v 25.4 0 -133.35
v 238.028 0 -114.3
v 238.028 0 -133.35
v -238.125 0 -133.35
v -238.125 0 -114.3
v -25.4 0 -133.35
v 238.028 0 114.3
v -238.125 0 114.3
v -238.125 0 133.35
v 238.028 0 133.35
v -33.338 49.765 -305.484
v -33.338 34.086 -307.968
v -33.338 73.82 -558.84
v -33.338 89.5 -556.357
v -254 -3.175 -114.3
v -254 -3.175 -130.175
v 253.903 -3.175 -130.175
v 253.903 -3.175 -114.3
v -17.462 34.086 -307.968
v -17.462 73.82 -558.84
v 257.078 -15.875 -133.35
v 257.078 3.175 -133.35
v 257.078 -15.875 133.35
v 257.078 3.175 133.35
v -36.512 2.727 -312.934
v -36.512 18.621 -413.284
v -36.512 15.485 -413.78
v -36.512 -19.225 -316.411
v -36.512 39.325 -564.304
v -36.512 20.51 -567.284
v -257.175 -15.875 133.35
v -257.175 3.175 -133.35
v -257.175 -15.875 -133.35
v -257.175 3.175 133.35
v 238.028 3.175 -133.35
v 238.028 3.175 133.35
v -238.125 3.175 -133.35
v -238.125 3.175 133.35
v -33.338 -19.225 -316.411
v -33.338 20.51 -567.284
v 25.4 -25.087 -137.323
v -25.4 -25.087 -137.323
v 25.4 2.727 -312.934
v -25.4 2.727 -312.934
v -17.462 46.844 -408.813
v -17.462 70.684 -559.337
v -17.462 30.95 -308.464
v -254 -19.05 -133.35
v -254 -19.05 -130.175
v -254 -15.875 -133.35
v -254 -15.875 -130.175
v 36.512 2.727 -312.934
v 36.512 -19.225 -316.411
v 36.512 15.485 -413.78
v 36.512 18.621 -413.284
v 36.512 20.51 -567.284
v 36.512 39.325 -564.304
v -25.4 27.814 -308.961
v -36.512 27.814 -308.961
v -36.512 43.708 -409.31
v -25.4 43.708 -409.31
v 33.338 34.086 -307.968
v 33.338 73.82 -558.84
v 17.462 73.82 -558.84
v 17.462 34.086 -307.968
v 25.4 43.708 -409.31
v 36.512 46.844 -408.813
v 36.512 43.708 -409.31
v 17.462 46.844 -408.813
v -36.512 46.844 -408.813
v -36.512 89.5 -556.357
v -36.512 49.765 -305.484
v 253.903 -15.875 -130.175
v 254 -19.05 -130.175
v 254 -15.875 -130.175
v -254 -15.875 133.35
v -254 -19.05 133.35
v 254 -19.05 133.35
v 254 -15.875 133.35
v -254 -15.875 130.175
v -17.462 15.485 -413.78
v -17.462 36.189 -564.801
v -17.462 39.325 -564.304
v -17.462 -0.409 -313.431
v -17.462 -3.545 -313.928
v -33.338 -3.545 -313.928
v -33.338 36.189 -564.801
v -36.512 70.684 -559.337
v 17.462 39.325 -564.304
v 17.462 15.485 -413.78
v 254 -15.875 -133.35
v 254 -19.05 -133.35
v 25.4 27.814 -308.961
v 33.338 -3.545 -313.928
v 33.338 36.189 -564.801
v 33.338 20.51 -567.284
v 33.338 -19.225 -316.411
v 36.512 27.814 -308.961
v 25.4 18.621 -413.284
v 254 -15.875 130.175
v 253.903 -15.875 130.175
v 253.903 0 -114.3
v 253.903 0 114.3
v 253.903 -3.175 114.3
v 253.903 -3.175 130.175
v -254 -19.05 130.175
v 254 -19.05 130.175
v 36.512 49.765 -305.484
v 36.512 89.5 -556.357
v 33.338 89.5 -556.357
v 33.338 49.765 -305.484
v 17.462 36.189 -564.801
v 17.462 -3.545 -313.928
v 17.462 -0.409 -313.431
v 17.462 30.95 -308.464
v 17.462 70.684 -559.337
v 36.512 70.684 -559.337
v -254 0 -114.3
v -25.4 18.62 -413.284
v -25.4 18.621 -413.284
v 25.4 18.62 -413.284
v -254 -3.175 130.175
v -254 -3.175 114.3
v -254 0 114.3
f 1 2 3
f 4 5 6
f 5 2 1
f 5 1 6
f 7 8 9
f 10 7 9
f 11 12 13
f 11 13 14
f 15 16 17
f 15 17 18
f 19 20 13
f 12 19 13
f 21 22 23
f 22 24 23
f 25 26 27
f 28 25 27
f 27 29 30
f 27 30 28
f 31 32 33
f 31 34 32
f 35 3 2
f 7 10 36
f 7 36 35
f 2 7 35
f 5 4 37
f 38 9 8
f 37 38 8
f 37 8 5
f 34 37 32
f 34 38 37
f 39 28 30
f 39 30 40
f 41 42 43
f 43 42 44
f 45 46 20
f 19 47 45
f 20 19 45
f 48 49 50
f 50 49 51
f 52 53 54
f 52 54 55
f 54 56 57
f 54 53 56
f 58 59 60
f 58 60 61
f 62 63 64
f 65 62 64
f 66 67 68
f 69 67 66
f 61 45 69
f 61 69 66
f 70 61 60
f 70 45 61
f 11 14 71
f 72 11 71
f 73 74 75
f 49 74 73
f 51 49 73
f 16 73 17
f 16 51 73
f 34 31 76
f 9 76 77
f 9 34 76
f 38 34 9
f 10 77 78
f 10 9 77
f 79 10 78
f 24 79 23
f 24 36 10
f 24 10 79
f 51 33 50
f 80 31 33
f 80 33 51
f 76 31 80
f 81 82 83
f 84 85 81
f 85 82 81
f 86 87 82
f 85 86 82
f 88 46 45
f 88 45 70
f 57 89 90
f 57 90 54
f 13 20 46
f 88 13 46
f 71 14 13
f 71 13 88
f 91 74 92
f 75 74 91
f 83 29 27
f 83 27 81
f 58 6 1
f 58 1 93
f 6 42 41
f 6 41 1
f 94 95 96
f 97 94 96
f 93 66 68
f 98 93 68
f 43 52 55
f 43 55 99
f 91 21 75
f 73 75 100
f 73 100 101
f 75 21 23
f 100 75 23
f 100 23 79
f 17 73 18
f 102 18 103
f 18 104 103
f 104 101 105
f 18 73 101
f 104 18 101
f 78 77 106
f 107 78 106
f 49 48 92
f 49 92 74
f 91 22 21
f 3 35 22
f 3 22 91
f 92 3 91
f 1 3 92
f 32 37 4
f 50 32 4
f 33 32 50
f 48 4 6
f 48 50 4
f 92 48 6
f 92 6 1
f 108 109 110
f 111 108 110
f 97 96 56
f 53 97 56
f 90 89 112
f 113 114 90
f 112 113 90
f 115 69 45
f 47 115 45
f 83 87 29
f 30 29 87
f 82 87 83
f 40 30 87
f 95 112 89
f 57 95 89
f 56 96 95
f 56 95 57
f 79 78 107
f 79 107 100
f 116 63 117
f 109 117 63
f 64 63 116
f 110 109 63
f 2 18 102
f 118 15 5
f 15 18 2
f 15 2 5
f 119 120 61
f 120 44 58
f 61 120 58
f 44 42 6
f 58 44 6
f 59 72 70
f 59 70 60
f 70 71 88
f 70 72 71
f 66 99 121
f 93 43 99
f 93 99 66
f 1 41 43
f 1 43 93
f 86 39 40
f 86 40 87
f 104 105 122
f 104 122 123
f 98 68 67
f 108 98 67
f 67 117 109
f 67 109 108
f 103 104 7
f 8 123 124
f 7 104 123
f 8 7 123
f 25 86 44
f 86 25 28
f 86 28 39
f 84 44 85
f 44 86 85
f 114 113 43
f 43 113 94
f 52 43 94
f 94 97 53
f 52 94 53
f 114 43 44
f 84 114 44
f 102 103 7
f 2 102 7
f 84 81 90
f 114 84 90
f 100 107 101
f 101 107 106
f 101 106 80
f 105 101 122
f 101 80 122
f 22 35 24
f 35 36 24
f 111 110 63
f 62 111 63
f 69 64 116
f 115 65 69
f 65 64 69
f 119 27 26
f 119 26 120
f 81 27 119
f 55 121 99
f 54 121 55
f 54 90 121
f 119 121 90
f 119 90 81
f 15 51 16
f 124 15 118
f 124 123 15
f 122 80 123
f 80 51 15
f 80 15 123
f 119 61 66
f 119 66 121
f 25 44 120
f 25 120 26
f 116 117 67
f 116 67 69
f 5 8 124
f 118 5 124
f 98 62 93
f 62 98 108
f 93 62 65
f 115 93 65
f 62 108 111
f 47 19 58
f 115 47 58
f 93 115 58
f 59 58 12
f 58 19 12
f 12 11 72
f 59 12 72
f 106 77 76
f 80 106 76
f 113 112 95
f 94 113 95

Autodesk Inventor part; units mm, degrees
ref_plane "YZ Plane" through (0, 0, 0) normal (1, 0, 0) x (0, 1, 0)
sketch "Sketch1" plane through (0, 0, 0) normal (1, 0, 0) x (0, 1, 0)
  line L0 (-3.175, 114.3) -> (0, 114.3)
  line L1 (0, 114.3) -> (0, 133.35)
  line L2 (0, 133.35) -> (-19.05, 133.35)
  line L3 (-19.05, 133.35) -> (-19.05, 130.175)
  line L4 (-19.05, 130.175) -> (-3.175, 130.175)
  line L5 (-3.175, 130.175) -> (-3.175, 114.3)
  line L6 (0, -114.3) -> (0, -133.35)
  line L7 (0, -133.35) -> (-19.05, -133.35)
  line L8 (-19.05, -133.35) -> (-19.05, -130.175)
  line L9 (-19.05, -130.175) -> (-3.175, -130.175)
  line L10 (-3.175, -130.175) -> (-3.175, -114.3)
  line L11 (-3.175, -114.3) -> (0, -114.3)
  line L12 (-25.4768, 0) -> (19.5105, 0) construction
  line L13 (0, -349.8749) -> (0, 213.8875) construction
  point P0 (0, 0)
  dimension "d0" = 19.05
  dimension "d1" = 19.05
  dimension "d3" = 266.7
  dimension "d4" = 3.175
extrude "Extrusion1" add sketch "Sketch1" along normal mid plane 508
sketch "Sketch3" plane through (0, 0, 0) normal (1, 0, 0) x (0, 1, 0)
  line L0 (-25.0873, -137.3234) -> (18.6205, -413.2836)
  line L1 (0, -323.2049) -> (0, 53.8675) projected
  line L2 (-25.0873, -137.3234) -> (0, -133.35)
  line L3 (0, -133.35) -> (43.7078, -409.3101)
  line L4 (43.7078, -409.3101) -> (18.6205, -413.2836)
  point P0 (0, 0)
  dimension "d7" = 9
  dimension "d8" = 279.4
  dimension "d10" = 25.4
extrude "Extrusion2" add sketch "Sketch3" along normal mid plane 50.8
sketch "Sketch12" plane through (-25.4, -25.0873, -137.3234) normal (0, -0.1564, 0.9877) x (1, 0, 0)
  line L0 (3.175, 3.175) -> (47.625, 3.175)
  line L1 (47.625, 3.175) -> (47.625, 22.225)
  line L2 (47.625, 22.225) -> (3.175, 22.225)
  line L3 (3.175, 22.225) -> (3.175, 3.175)
  line L4 (0, 25.4) -> (50.8, 25.4) projected
  line L5 (50.8, 0) -> (50.8, 25.4) projected
  line L6 (0, 25.4) -> (0, 0) projected
  line L7 (0, 0) -> (50.8, 0) projected
  point P0 (25.4, 46.2605)
  dimension "d50" = 3.175
  dimension "d51" = 3.175
  dimension "d52" = 3.175
  dimension "d53" = 3.175
sketch "Sketch4" plane through (-254, -19.05, 133.35) normal (0, 0, 1) x (1, 0, 0)
  line L0 (228.6, 19.05) -> (0, 19.05) projected
  line L1 (15.875, 19.05) -> (15.875, 22.225)
  line L2 (15.875, 22.225) -> (-3.175, 22.225)
  line L3 (-3.175, 22.225) -> (-3.175, 3.175)
  line L4 (-3.175, 3.175) -> (0, 3.175)
  line L5 (0, 3.175) -> (0, 19.05)
  line L6 (0, 19.05) -> (15.875, 19.05)
  line L7 (492.028, 19.05) -> (492.028, 22.225)
  line L8 (492.028, 22.225) -> (511.078, 22.225)
  line L9 (511.078, 22.225) -> (511.078, 3.175)
  line L10 (511.078, 3.175) -> (507.903, 3.175)
  line L11 (507.903, 3.175) -> (507.903, 19.05)
  line L12 (507.903, 19.05) -> (492.028, 19.05)
  line L13 (508, 19.05) -> (279.4, 19.05) projected
  line L14 (0, 19.05) -> (508, 19.05) projected
  point P0 (254, 19.05)
  dimension "d13" = 19.05
  dimension "d15" = 3.175
extrude "Extrusion3" add sketch "Sketch4" against normal up to surface (266.7 mm away)
sketch "Sketch6" plane through (25.4, 43.7078, -409.3101) normal (0, 0.1564, -0.9877) x (-1, 0, 0)
  line L0 (50.8, 0) -> (0, 0) construction
  line L1 (0, -25.4) -> (0, 0) construction
  line L2 (50.8, -25.4) -> (0, -25.4) construction
  line L3 (50.8, 0) -> (50.8, -25.4) construction
  line L4 (0, 0) -> (50.8, 0) construction
  line L5 (42.8625, 3.175) -> (42.8625, 6.35)
  line L6 (42.8625, 6.35) -> (58.7375, 6.35)
  line L7 (58.7375, 6.35) -> (58.7375, 22.225)
  line L8 (58.7375, 22.225) -> (61.9125, 22.225)
  line L9 (61.9125, 22.225) -> (61.9125, 3.175)
  line L10 (42.8625, 3.175) -> (61.9125, 3.175)
  line L11 (25.4, -25.4) -> (25.4, -0.1558) construction
  point P0 (25.4, 20.8605)
  dimension "d18" = 19.05
  dimension "d19" = 3.175
  dimension "d20" = 25.4
  dimension "d21" = 17.4625
  dimension "d47" = 3.175
extrude "Extrusion4" add sketch "Sketch6" along normal blind 152.4 and the other way blind 101.6
ref_plane "Work Plane1" through (0, 0, 0) normal (-1, 0, 0) x (0, 0, 1)
mirror "Mirror1" about plane through (0, 0, 0) normal (-1, 0, 0) of "Extrusion4"
sketch "Sketch10" plane through (25.4, 43.7078, -409.3101) normal (0, 0.1564, -0.9877) x (-1, 0, 0)
  line L0 (-11.1125, 3.175) -> (61.9125, 3.175)
  line L1 (61.9125, 3.175) -> (61.9125, 0)
  line L2 (61.9125, 0) -> (-11.1125, 0)
  line L3 (-11.1125, 0) -> (-11.1125, 3.175)
  line L4 (61.9125, 3.175) -> (61.9125, 22.225) projected
  line L5 (50.8, 0) -> (0, 0) projected
  line L6 (42.8625, 3.175) -> (61.9125, 3.175) projected
  line L7 (-11.1125, 3.175) -> (-11.1125, 22.225) projected
  point P0 (25.4, 20.8605)
extrude "Extrusion6" add sketch "Sketch10" against normal up to surface (101.6 mm away)
ref_plane "Work Plane2" through (-25.4, -12.5436, -135.3367) normal (0, 0.9877, 0.1564) x (1, 0, 0)
mirror "Mirror2" about plane through (-25.4, -12.5436, -135.3367) normal (0, 0.9877, 0.1564) of "Extrusion4", "Mirror1", "Extrusion6"
properties part number "Prow rev2"
